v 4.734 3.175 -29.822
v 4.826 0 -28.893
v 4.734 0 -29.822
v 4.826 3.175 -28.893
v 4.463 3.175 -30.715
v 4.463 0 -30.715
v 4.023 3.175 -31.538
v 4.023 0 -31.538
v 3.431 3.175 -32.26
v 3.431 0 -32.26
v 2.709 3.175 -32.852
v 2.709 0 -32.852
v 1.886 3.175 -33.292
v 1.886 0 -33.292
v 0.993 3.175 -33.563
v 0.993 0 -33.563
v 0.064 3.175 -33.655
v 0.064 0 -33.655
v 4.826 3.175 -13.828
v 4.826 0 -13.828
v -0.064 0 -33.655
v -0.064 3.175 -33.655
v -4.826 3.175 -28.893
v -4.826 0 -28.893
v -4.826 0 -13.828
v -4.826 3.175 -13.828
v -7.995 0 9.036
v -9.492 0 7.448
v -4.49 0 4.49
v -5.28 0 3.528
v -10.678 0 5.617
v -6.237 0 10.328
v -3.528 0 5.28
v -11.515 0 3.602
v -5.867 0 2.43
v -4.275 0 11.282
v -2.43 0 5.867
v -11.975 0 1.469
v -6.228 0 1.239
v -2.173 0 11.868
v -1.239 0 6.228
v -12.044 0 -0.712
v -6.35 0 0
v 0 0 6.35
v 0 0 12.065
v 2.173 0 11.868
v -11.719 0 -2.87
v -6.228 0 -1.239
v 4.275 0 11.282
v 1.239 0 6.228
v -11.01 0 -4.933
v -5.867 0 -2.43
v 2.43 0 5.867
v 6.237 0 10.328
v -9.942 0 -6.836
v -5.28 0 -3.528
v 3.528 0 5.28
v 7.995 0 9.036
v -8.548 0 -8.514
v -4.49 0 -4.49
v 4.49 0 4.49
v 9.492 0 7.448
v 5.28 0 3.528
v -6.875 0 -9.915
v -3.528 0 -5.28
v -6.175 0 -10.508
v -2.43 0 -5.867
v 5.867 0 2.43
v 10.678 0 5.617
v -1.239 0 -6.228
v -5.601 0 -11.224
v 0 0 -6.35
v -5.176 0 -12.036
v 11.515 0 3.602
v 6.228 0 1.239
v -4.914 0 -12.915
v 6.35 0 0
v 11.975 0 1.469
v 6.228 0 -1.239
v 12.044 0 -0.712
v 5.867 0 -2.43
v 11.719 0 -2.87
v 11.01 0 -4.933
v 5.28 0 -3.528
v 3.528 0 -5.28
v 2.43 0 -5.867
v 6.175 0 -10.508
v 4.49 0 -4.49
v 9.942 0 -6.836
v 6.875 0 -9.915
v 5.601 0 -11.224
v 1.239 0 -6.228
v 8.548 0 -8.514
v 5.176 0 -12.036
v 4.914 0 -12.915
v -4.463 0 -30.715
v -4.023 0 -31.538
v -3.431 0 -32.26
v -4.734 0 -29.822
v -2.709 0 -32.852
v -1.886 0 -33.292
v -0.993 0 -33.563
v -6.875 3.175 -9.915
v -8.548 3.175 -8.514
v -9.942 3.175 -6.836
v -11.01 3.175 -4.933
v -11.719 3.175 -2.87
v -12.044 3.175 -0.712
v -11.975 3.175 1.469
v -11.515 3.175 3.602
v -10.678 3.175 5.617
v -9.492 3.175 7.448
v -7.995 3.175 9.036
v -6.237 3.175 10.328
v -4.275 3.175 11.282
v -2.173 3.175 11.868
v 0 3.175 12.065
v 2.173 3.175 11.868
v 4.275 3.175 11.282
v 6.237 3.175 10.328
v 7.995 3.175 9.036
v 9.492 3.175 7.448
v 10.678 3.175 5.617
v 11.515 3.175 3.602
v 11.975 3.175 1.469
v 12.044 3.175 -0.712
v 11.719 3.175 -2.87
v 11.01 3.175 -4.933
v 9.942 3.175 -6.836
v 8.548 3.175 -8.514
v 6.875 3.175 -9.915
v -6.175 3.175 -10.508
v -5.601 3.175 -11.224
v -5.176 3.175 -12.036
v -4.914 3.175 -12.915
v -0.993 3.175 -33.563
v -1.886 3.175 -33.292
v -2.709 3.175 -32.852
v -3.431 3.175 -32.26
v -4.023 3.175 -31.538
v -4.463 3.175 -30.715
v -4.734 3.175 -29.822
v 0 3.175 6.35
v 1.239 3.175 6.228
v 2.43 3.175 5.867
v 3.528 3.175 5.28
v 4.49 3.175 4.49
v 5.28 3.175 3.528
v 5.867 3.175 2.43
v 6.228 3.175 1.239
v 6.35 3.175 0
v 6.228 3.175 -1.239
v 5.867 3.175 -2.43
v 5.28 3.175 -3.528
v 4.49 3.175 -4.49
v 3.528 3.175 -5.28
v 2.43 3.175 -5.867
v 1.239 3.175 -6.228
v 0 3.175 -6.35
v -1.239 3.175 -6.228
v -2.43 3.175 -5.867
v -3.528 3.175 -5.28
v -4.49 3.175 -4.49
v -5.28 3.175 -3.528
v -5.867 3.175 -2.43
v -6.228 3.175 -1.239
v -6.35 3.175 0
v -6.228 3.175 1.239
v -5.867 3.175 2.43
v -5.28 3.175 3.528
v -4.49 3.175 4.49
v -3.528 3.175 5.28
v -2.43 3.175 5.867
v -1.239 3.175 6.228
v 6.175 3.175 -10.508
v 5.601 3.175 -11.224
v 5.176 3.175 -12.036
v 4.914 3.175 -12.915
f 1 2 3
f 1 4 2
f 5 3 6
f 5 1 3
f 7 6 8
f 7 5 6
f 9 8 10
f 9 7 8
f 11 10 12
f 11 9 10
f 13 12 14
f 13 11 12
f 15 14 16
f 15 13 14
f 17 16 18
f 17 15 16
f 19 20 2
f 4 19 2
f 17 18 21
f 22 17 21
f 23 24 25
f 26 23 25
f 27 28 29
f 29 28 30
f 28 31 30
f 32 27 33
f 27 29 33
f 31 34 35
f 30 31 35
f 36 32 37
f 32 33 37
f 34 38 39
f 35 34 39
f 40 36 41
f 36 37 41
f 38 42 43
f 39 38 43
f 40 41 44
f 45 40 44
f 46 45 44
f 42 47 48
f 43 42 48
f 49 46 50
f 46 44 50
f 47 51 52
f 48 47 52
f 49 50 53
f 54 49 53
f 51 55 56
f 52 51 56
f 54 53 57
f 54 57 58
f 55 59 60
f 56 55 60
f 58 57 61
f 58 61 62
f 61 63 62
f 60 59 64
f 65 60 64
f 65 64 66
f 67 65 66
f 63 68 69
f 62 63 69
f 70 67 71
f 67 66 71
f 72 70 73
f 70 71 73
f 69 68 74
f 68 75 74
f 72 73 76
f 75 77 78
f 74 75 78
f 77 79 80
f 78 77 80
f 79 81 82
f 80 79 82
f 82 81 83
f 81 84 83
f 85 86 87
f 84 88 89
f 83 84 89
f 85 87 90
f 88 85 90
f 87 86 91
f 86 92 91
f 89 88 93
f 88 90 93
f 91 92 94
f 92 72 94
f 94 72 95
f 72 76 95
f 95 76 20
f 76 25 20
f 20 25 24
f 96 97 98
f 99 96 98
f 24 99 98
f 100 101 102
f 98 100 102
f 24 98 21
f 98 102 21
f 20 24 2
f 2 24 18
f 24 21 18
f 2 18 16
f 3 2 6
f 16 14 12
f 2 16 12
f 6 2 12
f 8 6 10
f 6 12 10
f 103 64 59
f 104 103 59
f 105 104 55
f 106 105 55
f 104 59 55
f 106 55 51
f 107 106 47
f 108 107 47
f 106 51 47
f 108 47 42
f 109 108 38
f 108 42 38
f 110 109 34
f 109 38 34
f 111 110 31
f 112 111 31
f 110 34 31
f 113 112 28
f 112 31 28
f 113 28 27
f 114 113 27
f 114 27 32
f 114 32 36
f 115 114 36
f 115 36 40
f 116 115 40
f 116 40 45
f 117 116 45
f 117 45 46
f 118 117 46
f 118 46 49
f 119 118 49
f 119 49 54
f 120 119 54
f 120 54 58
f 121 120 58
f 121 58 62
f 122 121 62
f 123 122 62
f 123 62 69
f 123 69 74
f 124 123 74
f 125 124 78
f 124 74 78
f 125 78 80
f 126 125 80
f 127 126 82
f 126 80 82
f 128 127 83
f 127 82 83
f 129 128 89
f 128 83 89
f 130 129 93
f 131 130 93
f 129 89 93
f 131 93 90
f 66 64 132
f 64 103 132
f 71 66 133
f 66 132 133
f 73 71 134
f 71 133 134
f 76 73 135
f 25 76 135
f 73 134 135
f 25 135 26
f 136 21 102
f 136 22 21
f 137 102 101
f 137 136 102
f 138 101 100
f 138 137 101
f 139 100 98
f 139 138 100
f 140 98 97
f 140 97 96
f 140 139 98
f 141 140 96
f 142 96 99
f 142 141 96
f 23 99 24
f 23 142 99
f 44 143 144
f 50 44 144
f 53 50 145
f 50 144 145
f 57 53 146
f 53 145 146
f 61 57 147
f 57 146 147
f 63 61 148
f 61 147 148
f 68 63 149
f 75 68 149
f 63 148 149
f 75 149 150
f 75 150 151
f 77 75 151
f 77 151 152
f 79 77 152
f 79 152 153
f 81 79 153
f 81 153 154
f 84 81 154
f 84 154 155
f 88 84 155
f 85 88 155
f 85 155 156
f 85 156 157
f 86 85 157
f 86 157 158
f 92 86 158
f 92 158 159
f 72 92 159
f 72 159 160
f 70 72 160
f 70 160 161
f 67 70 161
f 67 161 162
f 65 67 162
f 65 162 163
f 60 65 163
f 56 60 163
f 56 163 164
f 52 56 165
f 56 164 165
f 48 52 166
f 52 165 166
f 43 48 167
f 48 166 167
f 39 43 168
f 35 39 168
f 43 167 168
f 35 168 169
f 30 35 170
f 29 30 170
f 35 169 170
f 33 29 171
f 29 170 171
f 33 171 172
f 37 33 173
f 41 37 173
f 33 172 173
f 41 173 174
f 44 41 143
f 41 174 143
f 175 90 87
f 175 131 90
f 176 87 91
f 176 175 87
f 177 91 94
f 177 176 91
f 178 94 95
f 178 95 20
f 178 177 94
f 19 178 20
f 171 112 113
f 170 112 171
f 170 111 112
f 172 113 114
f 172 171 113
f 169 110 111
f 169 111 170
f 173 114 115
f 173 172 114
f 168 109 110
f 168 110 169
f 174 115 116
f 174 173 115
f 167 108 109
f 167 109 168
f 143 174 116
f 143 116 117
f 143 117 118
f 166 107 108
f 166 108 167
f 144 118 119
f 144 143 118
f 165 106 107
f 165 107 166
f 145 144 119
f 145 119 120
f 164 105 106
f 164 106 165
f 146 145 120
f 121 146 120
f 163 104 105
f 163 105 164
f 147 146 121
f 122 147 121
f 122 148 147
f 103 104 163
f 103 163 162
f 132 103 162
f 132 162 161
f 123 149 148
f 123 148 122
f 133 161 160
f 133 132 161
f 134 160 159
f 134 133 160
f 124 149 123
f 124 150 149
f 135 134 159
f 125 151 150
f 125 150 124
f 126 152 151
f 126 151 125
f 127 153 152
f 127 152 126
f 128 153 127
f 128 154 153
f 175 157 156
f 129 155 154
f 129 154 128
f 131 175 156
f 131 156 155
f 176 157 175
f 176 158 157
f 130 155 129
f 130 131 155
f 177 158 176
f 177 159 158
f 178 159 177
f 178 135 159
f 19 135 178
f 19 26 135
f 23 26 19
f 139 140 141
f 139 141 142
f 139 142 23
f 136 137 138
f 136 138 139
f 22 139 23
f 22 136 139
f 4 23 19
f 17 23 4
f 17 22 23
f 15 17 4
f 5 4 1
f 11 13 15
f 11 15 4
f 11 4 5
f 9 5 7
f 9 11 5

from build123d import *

# Parameters (mm, degrees)
BOSS_EXTRUDE1_DEPTH = 3.175
FILLET1_R           = 4.7625
SKETCH2_R           = 6.35
CUT_EXTRUDE1_DEPTH  = 36.892950213


with BuildPart() as part:
    # Sketch1 → Boss-Extrude1 (new body)
    with BuildSketch(Plane(origin=(0, 0, 0), x_dir=(1, 0, 0), z_dir=(0, 1, 0))):
        with BuildLine():
            ThreePointArc((-4.826, 11.057755152), (0, -12.065), (4.826, 11.057755152))
            Line((4.826, 11.057755152), (4.826, 33.655))
            Line((4.826, 33.655), (-4.826, 33.655))
            Line((-4.826, 33.655), (-4.826, 11.057755152))
        make_face()
    extrude(amount=BOSS_EXTRUDE1_DEPTH)

    # Fillet1
    fillet1_edges = [part.edges().sort_by_distance(p)[0] for p in [
        (4.826, 1.5875, -11.057755152),
        (-4.826, 1.5875, -11.057755152),
        (-4.826, 1.5875, -33.655),
        (4.826, 1.5875, -33.655),
    ]]
    fillet(fillet1_edges, radius=FILLET1_R)

    # Sketch2 → Cut-Extrude1 (cut, through all)
    with BuildSketch(Plane(origin=(0, 3.175, 0), x_dir=(1, 0, 0), z_dir=(0, 1, 0))):
        with Locations(Location((0, 0, 0), (0, 0, 270))):
            Circle(SKETCH2_R)
    extrude(amount=-CUT_EXTRUDE1_DEPTH, mode=Mode.SUBTRACT)


solid = part.part
